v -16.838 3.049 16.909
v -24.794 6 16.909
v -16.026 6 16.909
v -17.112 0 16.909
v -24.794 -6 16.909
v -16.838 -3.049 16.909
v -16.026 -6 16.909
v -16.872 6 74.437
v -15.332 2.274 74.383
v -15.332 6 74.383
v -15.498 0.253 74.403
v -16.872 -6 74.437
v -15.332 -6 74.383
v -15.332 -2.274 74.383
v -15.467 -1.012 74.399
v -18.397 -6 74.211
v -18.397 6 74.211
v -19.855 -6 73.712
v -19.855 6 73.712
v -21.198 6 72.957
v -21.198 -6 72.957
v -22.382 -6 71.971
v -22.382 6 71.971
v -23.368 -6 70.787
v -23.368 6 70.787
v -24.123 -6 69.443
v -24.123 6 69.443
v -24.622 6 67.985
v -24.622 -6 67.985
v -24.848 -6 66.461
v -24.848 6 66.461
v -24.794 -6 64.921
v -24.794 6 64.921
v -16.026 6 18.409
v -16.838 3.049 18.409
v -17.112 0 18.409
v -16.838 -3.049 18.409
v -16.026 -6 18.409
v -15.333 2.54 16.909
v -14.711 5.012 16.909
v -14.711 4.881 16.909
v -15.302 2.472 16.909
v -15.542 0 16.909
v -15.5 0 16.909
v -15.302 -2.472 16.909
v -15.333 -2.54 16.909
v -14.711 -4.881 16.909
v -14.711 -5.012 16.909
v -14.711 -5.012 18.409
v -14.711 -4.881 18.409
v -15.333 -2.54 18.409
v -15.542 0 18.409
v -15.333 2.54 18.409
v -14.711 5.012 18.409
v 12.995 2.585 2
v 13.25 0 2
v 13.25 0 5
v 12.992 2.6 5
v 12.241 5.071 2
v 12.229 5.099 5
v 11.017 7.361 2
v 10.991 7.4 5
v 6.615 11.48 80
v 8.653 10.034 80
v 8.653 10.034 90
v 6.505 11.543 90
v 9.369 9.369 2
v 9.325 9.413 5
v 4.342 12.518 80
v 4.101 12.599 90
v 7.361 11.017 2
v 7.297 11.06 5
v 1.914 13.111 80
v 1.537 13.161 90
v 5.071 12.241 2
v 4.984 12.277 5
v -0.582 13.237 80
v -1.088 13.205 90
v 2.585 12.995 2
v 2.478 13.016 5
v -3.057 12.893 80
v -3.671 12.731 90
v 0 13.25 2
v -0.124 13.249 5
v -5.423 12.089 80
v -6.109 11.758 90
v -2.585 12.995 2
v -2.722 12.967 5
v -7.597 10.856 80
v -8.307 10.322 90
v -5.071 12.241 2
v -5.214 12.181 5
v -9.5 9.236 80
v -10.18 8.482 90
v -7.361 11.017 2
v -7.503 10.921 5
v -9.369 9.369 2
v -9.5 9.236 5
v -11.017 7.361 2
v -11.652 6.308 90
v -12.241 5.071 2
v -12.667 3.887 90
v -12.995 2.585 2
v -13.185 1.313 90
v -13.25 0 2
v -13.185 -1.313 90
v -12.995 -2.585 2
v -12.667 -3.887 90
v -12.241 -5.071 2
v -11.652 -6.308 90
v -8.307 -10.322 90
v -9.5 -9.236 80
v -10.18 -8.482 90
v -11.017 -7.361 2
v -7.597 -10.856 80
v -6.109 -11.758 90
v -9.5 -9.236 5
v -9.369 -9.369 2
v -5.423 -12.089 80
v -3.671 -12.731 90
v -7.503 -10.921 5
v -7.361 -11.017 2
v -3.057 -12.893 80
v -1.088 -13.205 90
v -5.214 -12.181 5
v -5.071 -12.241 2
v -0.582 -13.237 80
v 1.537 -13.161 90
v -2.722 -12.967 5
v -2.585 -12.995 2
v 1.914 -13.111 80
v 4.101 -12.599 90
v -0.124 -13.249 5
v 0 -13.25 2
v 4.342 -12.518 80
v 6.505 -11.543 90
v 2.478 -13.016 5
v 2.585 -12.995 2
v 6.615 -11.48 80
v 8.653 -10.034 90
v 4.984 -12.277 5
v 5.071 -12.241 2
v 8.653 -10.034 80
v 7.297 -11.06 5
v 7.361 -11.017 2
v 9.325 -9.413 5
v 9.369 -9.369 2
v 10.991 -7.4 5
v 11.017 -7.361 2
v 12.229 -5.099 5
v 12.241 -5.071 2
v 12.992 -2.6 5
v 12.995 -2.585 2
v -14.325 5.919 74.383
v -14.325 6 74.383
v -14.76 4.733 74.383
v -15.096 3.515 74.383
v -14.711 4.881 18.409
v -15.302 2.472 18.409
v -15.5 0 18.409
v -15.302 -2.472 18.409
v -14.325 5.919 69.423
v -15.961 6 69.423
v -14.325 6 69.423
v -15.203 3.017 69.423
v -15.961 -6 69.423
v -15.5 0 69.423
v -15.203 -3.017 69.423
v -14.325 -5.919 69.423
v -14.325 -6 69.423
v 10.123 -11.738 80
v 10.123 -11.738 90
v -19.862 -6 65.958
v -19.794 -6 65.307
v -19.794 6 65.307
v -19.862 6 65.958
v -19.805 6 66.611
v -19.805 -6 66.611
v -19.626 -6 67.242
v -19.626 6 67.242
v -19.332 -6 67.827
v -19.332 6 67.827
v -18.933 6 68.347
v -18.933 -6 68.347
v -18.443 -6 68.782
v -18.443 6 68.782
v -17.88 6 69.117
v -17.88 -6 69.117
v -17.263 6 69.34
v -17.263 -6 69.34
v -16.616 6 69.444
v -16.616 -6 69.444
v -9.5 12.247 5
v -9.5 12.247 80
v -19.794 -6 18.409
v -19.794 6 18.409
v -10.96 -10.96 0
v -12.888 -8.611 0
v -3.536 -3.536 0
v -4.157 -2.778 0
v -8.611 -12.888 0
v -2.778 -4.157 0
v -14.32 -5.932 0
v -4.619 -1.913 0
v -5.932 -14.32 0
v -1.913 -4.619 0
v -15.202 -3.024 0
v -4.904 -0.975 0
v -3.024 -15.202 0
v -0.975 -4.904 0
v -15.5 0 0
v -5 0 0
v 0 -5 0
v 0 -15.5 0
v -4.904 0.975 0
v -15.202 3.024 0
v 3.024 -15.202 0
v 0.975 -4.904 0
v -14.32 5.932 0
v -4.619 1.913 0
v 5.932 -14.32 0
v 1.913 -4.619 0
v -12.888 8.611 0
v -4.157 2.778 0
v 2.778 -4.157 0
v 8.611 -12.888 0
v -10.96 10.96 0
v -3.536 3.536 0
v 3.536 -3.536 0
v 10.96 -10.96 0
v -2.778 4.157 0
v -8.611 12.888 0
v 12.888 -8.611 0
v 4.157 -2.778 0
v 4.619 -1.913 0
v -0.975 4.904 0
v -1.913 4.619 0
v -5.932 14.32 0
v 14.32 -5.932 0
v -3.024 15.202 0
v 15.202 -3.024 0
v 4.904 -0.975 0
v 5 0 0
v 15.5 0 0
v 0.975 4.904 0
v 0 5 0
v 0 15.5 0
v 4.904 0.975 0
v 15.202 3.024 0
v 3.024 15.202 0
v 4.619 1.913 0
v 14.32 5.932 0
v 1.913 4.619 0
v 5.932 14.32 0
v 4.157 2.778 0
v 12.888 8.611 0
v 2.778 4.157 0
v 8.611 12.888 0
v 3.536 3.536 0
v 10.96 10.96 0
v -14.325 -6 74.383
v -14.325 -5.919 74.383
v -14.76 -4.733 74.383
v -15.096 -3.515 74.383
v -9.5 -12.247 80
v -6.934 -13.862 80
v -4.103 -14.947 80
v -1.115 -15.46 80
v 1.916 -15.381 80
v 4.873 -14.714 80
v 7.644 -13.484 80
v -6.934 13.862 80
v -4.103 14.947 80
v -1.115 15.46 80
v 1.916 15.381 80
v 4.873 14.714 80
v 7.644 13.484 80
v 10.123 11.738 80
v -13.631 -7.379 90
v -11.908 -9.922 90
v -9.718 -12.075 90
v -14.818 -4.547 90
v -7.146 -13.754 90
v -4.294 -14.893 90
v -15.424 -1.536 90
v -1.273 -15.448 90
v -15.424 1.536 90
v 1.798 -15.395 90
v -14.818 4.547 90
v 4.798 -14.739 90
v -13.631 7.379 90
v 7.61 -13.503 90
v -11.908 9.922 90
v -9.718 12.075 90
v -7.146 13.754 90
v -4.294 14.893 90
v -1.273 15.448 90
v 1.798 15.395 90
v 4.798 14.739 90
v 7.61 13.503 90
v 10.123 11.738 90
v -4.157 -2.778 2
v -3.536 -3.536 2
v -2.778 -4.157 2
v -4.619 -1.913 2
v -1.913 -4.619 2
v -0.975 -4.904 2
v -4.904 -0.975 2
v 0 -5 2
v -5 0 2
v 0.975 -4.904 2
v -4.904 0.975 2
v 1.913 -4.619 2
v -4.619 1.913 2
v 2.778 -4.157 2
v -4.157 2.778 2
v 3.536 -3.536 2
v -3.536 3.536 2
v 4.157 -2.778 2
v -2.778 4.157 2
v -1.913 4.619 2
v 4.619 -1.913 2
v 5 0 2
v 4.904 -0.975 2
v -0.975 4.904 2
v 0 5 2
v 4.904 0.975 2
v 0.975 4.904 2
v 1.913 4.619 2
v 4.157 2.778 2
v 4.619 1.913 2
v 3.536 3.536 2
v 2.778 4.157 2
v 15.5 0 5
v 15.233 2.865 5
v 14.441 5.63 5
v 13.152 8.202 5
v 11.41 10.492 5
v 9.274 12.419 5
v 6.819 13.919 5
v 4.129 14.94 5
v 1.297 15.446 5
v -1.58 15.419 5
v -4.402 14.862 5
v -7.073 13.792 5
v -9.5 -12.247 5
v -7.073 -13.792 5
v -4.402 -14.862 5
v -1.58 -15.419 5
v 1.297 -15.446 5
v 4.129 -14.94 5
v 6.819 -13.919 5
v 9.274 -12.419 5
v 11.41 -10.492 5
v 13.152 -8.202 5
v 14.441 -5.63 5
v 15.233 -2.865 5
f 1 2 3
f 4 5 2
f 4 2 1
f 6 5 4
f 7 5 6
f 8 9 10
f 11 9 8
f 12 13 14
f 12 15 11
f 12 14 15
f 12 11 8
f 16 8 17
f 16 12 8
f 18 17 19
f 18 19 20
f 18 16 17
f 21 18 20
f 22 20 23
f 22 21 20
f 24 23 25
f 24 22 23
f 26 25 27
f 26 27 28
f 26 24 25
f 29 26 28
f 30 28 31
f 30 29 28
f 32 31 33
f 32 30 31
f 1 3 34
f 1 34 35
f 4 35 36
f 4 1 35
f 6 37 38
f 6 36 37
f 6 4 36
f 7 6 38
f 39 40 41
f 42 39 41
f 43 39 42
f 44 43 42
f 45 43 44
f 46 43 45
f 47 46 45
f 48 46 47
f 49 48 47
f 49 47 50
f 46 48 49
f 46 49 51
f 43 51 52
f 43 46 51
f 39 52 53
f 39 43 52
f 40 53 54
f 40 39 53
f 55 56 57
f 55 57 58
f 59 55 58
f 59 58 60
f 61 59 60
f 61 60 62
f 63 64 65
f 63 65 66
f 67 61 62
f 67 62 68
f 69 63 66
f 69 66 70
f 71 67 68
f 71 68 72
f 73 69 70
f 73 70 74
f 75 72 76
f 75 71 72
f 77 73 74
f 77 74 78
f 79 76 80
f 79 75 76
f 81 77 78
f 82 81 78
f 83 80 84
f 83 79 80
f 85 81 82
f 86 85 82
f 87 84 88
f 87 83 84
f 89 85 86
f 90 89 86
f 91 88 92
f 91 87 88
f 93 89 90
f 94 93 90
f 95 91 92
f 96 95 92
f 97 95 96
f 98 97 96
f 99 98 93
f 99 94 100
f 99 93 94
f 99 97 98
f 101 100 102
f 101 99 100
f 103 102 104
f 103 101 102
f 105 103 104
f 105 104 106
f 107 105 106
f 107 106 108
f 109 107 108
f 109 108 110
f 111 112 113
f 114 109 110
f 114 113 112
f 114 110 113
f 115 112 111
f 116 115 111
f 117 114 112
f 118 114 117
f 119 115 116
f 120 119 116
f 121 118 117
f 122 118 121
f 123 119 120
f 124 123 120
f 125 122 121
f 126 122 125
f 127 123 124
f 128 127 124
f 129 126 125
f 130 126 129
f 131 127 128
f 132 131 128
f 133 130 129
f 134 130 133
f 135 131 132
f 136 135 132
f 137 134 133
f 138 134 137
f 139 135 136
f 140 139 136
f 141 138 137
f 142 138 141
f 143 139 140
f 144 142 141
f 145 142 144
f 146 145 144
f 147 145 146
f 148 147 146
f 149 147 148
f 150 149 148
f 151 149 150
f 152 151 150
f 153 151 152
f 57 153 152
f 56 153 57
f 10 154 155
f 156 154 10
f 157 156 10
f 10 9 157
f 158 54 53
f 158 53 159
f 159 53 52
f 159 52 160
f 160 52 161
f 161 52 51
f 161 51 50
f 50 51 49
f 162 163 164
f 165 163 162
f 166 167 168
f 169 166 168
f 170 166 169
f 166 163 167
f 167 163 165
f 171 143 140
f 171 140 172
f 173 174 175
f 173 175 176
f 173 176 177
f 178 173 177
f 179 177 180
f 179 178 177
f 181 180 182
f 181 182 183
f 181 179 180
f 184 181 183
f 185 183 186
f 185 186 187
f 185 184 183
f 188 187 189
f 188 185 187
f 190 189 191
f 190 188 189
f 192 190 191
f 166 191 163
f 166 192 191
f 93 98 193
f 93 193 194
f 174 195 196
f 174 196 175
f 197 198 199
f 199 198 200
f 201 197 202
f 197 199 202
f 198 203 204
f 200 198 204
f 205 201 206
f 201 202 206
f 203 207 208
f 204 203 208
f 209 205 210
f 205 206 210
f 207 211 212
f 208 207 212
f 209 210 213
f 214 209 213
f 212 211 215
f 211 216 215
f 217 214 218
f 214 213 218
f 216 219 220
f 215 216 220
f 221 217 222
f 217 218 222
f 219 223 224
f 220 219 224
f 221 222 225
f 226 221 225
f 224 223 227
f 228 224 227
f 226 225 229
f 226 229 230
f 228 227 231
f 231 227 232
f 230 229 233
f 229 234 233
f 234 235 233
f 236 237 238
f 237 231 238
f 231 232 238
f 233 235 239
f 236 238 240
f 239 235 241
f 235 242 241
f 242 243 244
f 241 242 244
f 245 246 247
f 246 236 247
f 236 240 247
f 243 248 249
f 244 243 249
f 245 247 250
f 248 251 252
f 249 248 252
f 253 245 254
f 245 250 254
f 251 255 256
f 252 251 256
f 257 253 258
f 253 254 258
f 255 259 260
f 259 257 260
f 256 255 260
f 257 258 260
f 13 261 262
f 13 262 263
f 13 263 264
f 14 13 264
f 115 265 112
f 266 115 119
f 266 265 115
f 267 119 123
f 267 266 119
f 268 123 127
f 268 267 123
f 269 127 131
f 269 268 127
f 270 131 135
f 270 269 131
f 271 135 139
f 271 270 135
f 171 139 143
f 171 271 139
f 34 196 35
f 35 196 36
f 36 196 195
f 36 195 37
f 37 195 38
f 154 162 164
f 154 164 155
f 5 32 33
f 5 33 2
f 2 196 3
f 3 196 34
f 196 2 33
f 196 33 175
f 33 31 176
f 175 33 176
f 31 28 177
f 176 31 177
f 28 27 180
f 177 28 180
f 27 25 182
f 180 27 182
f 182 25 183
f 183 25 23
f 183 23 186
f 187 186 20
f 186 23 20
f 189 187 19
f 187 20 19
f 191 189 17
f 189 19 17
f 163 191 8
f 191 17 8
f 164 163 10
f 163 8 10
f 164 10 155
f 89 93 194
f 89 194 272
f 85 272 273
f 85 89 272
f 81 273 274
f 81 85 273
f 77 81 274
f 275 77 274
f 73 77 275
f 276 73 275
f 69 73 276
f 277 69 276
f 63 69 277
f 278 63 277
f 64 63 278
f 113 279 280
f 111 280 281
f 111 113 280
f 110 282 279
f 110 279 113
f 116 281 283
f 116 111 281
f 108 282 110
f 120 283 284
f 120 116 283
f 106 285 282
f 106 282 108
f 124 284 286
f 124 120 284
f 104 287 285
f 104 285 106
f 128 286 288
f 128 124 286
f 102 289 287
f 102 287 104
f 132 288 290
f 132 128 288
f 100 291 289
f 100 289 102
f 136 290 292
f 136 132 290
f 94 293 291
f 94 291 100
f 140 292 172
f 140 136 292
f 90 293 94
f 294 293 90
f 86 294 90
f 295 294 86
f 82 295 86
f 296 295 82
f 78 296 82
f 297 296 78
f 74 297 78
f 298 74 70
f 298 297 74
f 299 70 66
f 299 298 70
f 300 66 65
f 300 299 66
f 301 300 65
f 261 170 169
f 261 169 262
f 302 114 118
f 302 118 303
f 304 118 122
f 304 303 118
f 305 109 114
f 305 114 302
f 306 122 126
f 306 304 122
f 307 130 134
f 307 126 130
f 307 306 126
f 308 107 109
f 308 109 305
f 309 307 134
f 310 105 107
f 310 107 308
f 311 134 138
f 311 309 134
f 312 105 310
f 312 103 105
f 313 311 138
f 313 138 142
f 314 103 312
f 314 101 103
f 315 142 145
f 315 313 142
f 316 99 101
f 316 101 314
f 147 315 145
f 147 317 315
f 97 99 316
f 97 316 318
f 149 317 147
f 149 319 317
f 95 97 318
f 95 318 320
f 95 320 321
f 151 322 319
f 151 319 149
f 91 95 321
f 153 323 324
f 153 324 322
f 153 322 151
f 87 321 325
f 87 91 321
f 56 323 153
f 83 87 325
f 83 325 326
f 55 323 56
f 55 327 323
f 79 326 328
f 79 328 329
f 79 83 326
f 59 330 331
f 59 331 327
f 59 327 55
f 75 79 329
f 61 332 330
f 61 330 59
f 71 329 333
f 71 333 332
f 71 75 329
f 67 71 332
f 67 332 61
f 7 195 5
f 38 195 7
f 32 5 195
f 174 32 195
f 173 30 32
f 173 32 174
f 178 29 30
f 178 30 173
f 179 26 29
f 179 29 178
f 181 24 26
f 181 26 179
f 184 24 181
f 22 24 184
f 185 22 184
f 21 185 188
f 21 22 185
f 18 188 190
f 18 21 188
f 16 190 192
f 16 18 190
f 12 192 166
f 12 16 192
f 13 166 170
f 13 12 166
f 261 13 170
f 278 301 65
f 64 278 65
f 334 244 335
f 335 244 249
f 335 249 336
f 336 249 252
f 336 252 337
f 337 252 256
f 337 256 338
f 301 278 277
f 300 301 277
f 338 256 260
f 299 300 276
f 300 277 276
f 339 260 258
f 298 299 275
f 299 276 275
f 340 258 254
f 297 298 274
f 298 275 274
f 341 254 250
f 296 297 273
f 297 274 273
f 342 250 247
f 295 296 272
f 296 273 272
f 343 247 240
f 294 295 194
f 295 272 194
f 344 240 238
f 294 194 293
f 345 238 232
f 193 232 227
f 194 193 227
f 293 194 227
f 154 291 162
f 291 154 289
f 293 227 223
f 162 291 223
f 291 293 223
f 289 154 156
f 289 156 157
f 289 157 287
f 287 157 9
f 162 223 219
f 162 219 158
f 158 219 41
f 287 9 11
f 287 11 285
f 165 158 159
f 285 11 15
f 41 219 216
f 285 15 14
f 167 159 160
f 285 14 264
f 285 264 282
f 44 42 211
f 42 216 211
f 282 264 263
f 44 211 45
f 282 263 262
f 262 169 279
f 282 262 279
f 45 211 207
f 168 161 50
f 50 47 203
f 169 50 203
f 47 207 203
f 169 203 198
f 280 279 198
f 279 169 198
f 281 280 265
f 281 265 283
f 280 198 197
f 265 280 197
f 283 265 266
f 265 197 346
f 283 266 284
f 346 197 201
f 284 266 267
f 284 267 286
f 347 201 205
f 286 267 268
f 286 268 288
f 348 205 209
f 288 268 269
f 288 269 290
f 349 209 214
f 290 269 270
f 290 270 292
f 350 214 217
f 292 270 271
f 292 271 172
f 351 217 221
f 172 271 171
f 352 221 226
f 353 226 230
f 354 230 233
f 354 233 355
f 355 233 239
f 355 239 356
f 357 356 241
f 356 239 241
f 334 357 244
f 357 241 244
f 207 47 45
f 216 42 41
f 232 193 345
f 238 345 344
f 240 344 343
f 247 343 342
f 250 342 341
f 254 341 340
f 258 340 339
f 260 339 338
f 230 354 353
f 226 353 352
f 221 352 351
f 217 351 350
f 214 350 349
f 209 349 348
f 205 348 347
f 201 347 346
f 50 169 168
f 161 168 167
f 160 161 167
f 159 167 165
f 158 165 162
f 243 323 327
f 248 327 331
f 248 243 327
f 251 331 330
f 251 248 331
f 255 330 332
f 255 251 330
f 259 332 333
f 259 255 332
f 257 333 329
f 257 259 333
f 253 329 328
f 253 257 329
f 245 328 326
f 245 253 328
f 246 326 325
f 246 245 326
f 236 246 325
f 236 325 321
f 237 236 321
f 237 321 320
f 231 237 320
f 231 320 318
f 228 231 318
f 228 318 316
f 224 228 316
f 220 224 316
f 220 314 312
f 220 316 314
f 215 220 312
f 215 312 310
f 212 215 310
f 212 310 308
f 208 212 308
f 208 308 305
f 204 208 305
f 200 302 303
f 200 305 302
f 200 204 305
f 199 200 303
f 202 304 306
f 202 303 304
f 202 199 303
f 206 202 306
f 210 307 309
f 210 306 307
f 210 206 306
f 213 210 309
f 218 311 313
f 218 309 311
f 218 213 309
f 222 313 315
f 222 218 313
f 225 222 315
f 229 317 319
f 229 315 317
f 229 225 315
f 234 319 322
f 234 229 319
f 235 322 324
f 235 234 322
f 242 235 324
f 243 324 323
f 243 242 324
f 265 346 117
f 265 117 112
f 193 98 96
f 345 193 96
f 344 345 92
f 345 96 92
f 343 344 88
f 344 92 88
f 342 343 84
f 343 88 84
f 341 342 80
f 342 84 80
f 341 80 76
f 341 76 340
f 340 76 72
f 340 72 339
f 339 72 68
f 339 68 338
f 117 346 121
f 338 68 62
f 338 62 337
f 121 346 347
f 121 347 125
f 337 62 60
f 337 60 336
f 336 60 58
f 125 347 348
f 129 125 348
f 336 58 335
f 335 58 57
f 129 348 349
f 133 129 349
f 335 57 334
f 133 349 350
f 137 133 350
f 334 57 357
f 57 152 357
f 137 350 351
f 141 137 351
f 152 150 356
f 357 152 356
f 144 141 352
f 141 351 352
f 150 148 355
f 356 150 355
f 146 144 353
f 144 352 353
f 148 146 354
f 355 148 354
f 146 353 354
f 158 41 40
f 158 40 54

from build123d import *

# Parameters (mm, degrees)
F0_R      = 15.5
F0_R_2    = 13.25
F1_DEPTH  = 90
F2_R      = 15.5
F3_DEPTH  = 2
F4_R      = 5
F5_DEPTH  = 90.001
F6_W      = 25
F6_H      = 75
F7_DEPTH  = 30
F9_DEPTH  = 6
F10_W     = 5.0829965621
F10_H     = 1.5
F11_DEPTH = 6
F13_DEPTH = 25
F15_DEPTH = 25
F16_DEPTH = 25


# Not quite as in the source:
# - a feature names something its author has since deleted; it is built from what else it names


with BuildPart() as f1:
    # F0 (on Top) → F1 (new body)
    with BuildSketch(Plane.XY):
        Circle(F0_R)
        Circle(F0_R_2, mode=Mode.SUBTRACT)
    extrude(amount=F1_DEPTH)

    # F2 (on Top) → F3 (join)
    with BuildSketch(Plane.XY):
        Circle(F2_R)
    extrude(amount=F3_DEPTH)

    # F4 (on Top) → F5 (cut, through all)
    with BuildSketch(Plane.XY):
        Circle(F4_R)
    extrude(amount=F5_DEPTH, mode=Mode.SUBTRACT)

    # F6 (on Front) → F7 (cut, symmetric)
    with BuildSketch(Plane.XZ):
        with Locations((3, 42.5)):
            Rectangle(F6_W, F6_H)
    extrude(amount=F7_DEPTH, both=True, mode=Mode.SUBTRACT)

    # F8 (on Front) → F9 (join, symmetric)
    with BuildSketch(Plane.XZ):
        with BuildLine():
            Line((-14.3252154812, 74.3832364678), (-15.3322340921, 74.3832364678))
            ThreePointArc((-15.3322340921, 74.3832364678), (-22.3824376382, 71.9712620232), (-24.7944127768, 64.9210587144))
            Line((-24.7944127768, 64.9210587144), (-24.7944127768, 16.9092640281))
            Line((-24.7944127768, 16.9092640281), (-19.7944119573, 16.9092640281))
            Line((-19.7944119573, 16.9092640281), (-19.7944119573, 65.3066100025))
            ThreePointArc((-19.7944119573, 65.3066100025), (-18.9325593375, 68.3469659349), (-15.9612301203, 69.4229570209))
            Line((-15.9612301203, 69.4229570209), (-14.3252154812, 69.4229570209))
            Line((-14.3252154812, 69.4229570209), (-14.3252154812, 74.3832364678))
        make_face()
    extrude(amount=F9_DEPTH, both=True)

    # F10 (on Front) → F11 (join, symmetric)
    with BuildSketch(Plane.XZ):
        with BuildLine():
            Line((-14.3252154812, 74.3832364678), (-15.3322340921, 74.3832364678))
            ThreePointArc((-15.3322340921, 74.3832364678), (-22.3824376382, 71.9712620232), (-24.7944127768, 64.9210587144))
            Line((-24.7944127768, 64.9210587144), (-24.7944127768, 16.9092640281))
            Line((-24.7944127768, 16.9092640281), (-19.7944119573, 16.9092640281))
            Line((-19.7944119573, 16.9092640281), (-19.7944119573, 18.4092640281))
            Line((-19.7944119573, 18.4092640281), (-19.7944119573, 65.3066100025))
            ThreePointArc((-19.7944119573, 65.3066100025), (-18.9325593375, 68.3469659349), (-15.9612301203, 69.4229570209))
            Line((-15.9612301203, 69.4229570209), (-14.3252154812, 69.4229570209))
            Line((-14.3252154812, 69.4229570209), (-14.3252154812, 74.3832364678))
        make_face()
        with Locations((-17.2529136762, 17.6592640281)):
            Rectangle(F10_W, F10_H)
    extrude(amount=F11_DEPTH, both=True)

    # F12 (on Top) → F13 (cut)
    with BuildSketch(Plane.XY):
        with BuildLine():
            Line((-13.8731463173, 7.0058838464), (-15.6120072238, 7.0058838464))
            ThreePointArc((-15.6120072238, 7.0058838464), (-17.1111072391, 0.1648850375), (-15.74411501, -6.7037318396))
            Line((-15.74411501, -6.7037318396), (-14.0216467162, -6.7037318396))
            ThreePointArc((-14.0216467162, -6.7037318396), (-15.5408577678, 0.1683361248), (-13.8731463173, 7.0058838464))
        make_face()
    extrude(amount=F13_DEPTH, mode=Mode.SUBTRACT)

    # F14 (on face) → F15 (cut)
    with BuildSketch(Plane.XY.offset(90)):
        with BuildLine():
            Line((11.193397513, 12.9792110231), (0, 0))
            Line((0, 0), (11.193397513, -12.9792110231))
            ThreePointArc((11.193397513, -12.9792110231), (17.1391967918, 0), (11.193397513, 12.9792110231))
        make_face()
    extrude(amount=-F15_DEPTH, mode=Mode.SUBTRACT)

    # F14 (on face) → F16 (cut)
    with BuildSketch(Plane.XY.offset(90)):
        with BuildLine():
            Line((10.1228583556, 11.7378762437), (8.6534111749, 10.0339909826))
            ThreePointArc((8.6534111749, 10.0339909826), (12.0461653249, 5.5183694119), (13.25, 0))
            ThreePointArc((13.25, 0), (12.0461653249, -5.5183694119), (8.6534111749, -10.0339909826))
            Line((8.6534111749, -10.0339909826), (10.1228583556, -11.7378762437))
            ThreePointArc((10.1228583556, -11.7378762437), (14.0917405687, -6.4554510102), (15.5, 0))
            ThreePointArc((15.5, 0), (14.0917405687, 6.4554510102), (10.1228583556, 11.7378762437))
        make_face()
        with BuildLine():
            Line((11.193397513, 12.9792110231), (10.1228583556, 11.7378762437))
            ThreePointArc((10.1228583556, 11.7378762437), (14.0917405687, 6.4554510102), (15.5, 0))
            ThreePointArc((15.5, 0), (14.0917405687, -6.4554510102), (10.1228583556, -11.7378762437))
            Line((10.1228583556, -11.7378762437), (11.193397513, -12.9792110231))
            ThreePointArc((11.193397513, -12.9792110231), (17.1391967918, 0), (11.193397513, 12.9792110231))
        make_face()
        with BuildLine():
            Line((8.6534111749, 10.0339909826), (0, 0))
            Line((0, 0), (8.6534111749, -10.0339909826))
            ThreePointArc((8.6534111749, -10.0339909826), (12.0461653249, -5.5183694119), (13.25, 0))
            ThreePointArc((13.25, 0), (12.0461653249, 5.5183694119), (8.6534111749, 10.0339909826))
        make_face()
    extrude(amount=-F16_DEPTH, mode=Mode.SUBTRACT)


solid = f1.part
